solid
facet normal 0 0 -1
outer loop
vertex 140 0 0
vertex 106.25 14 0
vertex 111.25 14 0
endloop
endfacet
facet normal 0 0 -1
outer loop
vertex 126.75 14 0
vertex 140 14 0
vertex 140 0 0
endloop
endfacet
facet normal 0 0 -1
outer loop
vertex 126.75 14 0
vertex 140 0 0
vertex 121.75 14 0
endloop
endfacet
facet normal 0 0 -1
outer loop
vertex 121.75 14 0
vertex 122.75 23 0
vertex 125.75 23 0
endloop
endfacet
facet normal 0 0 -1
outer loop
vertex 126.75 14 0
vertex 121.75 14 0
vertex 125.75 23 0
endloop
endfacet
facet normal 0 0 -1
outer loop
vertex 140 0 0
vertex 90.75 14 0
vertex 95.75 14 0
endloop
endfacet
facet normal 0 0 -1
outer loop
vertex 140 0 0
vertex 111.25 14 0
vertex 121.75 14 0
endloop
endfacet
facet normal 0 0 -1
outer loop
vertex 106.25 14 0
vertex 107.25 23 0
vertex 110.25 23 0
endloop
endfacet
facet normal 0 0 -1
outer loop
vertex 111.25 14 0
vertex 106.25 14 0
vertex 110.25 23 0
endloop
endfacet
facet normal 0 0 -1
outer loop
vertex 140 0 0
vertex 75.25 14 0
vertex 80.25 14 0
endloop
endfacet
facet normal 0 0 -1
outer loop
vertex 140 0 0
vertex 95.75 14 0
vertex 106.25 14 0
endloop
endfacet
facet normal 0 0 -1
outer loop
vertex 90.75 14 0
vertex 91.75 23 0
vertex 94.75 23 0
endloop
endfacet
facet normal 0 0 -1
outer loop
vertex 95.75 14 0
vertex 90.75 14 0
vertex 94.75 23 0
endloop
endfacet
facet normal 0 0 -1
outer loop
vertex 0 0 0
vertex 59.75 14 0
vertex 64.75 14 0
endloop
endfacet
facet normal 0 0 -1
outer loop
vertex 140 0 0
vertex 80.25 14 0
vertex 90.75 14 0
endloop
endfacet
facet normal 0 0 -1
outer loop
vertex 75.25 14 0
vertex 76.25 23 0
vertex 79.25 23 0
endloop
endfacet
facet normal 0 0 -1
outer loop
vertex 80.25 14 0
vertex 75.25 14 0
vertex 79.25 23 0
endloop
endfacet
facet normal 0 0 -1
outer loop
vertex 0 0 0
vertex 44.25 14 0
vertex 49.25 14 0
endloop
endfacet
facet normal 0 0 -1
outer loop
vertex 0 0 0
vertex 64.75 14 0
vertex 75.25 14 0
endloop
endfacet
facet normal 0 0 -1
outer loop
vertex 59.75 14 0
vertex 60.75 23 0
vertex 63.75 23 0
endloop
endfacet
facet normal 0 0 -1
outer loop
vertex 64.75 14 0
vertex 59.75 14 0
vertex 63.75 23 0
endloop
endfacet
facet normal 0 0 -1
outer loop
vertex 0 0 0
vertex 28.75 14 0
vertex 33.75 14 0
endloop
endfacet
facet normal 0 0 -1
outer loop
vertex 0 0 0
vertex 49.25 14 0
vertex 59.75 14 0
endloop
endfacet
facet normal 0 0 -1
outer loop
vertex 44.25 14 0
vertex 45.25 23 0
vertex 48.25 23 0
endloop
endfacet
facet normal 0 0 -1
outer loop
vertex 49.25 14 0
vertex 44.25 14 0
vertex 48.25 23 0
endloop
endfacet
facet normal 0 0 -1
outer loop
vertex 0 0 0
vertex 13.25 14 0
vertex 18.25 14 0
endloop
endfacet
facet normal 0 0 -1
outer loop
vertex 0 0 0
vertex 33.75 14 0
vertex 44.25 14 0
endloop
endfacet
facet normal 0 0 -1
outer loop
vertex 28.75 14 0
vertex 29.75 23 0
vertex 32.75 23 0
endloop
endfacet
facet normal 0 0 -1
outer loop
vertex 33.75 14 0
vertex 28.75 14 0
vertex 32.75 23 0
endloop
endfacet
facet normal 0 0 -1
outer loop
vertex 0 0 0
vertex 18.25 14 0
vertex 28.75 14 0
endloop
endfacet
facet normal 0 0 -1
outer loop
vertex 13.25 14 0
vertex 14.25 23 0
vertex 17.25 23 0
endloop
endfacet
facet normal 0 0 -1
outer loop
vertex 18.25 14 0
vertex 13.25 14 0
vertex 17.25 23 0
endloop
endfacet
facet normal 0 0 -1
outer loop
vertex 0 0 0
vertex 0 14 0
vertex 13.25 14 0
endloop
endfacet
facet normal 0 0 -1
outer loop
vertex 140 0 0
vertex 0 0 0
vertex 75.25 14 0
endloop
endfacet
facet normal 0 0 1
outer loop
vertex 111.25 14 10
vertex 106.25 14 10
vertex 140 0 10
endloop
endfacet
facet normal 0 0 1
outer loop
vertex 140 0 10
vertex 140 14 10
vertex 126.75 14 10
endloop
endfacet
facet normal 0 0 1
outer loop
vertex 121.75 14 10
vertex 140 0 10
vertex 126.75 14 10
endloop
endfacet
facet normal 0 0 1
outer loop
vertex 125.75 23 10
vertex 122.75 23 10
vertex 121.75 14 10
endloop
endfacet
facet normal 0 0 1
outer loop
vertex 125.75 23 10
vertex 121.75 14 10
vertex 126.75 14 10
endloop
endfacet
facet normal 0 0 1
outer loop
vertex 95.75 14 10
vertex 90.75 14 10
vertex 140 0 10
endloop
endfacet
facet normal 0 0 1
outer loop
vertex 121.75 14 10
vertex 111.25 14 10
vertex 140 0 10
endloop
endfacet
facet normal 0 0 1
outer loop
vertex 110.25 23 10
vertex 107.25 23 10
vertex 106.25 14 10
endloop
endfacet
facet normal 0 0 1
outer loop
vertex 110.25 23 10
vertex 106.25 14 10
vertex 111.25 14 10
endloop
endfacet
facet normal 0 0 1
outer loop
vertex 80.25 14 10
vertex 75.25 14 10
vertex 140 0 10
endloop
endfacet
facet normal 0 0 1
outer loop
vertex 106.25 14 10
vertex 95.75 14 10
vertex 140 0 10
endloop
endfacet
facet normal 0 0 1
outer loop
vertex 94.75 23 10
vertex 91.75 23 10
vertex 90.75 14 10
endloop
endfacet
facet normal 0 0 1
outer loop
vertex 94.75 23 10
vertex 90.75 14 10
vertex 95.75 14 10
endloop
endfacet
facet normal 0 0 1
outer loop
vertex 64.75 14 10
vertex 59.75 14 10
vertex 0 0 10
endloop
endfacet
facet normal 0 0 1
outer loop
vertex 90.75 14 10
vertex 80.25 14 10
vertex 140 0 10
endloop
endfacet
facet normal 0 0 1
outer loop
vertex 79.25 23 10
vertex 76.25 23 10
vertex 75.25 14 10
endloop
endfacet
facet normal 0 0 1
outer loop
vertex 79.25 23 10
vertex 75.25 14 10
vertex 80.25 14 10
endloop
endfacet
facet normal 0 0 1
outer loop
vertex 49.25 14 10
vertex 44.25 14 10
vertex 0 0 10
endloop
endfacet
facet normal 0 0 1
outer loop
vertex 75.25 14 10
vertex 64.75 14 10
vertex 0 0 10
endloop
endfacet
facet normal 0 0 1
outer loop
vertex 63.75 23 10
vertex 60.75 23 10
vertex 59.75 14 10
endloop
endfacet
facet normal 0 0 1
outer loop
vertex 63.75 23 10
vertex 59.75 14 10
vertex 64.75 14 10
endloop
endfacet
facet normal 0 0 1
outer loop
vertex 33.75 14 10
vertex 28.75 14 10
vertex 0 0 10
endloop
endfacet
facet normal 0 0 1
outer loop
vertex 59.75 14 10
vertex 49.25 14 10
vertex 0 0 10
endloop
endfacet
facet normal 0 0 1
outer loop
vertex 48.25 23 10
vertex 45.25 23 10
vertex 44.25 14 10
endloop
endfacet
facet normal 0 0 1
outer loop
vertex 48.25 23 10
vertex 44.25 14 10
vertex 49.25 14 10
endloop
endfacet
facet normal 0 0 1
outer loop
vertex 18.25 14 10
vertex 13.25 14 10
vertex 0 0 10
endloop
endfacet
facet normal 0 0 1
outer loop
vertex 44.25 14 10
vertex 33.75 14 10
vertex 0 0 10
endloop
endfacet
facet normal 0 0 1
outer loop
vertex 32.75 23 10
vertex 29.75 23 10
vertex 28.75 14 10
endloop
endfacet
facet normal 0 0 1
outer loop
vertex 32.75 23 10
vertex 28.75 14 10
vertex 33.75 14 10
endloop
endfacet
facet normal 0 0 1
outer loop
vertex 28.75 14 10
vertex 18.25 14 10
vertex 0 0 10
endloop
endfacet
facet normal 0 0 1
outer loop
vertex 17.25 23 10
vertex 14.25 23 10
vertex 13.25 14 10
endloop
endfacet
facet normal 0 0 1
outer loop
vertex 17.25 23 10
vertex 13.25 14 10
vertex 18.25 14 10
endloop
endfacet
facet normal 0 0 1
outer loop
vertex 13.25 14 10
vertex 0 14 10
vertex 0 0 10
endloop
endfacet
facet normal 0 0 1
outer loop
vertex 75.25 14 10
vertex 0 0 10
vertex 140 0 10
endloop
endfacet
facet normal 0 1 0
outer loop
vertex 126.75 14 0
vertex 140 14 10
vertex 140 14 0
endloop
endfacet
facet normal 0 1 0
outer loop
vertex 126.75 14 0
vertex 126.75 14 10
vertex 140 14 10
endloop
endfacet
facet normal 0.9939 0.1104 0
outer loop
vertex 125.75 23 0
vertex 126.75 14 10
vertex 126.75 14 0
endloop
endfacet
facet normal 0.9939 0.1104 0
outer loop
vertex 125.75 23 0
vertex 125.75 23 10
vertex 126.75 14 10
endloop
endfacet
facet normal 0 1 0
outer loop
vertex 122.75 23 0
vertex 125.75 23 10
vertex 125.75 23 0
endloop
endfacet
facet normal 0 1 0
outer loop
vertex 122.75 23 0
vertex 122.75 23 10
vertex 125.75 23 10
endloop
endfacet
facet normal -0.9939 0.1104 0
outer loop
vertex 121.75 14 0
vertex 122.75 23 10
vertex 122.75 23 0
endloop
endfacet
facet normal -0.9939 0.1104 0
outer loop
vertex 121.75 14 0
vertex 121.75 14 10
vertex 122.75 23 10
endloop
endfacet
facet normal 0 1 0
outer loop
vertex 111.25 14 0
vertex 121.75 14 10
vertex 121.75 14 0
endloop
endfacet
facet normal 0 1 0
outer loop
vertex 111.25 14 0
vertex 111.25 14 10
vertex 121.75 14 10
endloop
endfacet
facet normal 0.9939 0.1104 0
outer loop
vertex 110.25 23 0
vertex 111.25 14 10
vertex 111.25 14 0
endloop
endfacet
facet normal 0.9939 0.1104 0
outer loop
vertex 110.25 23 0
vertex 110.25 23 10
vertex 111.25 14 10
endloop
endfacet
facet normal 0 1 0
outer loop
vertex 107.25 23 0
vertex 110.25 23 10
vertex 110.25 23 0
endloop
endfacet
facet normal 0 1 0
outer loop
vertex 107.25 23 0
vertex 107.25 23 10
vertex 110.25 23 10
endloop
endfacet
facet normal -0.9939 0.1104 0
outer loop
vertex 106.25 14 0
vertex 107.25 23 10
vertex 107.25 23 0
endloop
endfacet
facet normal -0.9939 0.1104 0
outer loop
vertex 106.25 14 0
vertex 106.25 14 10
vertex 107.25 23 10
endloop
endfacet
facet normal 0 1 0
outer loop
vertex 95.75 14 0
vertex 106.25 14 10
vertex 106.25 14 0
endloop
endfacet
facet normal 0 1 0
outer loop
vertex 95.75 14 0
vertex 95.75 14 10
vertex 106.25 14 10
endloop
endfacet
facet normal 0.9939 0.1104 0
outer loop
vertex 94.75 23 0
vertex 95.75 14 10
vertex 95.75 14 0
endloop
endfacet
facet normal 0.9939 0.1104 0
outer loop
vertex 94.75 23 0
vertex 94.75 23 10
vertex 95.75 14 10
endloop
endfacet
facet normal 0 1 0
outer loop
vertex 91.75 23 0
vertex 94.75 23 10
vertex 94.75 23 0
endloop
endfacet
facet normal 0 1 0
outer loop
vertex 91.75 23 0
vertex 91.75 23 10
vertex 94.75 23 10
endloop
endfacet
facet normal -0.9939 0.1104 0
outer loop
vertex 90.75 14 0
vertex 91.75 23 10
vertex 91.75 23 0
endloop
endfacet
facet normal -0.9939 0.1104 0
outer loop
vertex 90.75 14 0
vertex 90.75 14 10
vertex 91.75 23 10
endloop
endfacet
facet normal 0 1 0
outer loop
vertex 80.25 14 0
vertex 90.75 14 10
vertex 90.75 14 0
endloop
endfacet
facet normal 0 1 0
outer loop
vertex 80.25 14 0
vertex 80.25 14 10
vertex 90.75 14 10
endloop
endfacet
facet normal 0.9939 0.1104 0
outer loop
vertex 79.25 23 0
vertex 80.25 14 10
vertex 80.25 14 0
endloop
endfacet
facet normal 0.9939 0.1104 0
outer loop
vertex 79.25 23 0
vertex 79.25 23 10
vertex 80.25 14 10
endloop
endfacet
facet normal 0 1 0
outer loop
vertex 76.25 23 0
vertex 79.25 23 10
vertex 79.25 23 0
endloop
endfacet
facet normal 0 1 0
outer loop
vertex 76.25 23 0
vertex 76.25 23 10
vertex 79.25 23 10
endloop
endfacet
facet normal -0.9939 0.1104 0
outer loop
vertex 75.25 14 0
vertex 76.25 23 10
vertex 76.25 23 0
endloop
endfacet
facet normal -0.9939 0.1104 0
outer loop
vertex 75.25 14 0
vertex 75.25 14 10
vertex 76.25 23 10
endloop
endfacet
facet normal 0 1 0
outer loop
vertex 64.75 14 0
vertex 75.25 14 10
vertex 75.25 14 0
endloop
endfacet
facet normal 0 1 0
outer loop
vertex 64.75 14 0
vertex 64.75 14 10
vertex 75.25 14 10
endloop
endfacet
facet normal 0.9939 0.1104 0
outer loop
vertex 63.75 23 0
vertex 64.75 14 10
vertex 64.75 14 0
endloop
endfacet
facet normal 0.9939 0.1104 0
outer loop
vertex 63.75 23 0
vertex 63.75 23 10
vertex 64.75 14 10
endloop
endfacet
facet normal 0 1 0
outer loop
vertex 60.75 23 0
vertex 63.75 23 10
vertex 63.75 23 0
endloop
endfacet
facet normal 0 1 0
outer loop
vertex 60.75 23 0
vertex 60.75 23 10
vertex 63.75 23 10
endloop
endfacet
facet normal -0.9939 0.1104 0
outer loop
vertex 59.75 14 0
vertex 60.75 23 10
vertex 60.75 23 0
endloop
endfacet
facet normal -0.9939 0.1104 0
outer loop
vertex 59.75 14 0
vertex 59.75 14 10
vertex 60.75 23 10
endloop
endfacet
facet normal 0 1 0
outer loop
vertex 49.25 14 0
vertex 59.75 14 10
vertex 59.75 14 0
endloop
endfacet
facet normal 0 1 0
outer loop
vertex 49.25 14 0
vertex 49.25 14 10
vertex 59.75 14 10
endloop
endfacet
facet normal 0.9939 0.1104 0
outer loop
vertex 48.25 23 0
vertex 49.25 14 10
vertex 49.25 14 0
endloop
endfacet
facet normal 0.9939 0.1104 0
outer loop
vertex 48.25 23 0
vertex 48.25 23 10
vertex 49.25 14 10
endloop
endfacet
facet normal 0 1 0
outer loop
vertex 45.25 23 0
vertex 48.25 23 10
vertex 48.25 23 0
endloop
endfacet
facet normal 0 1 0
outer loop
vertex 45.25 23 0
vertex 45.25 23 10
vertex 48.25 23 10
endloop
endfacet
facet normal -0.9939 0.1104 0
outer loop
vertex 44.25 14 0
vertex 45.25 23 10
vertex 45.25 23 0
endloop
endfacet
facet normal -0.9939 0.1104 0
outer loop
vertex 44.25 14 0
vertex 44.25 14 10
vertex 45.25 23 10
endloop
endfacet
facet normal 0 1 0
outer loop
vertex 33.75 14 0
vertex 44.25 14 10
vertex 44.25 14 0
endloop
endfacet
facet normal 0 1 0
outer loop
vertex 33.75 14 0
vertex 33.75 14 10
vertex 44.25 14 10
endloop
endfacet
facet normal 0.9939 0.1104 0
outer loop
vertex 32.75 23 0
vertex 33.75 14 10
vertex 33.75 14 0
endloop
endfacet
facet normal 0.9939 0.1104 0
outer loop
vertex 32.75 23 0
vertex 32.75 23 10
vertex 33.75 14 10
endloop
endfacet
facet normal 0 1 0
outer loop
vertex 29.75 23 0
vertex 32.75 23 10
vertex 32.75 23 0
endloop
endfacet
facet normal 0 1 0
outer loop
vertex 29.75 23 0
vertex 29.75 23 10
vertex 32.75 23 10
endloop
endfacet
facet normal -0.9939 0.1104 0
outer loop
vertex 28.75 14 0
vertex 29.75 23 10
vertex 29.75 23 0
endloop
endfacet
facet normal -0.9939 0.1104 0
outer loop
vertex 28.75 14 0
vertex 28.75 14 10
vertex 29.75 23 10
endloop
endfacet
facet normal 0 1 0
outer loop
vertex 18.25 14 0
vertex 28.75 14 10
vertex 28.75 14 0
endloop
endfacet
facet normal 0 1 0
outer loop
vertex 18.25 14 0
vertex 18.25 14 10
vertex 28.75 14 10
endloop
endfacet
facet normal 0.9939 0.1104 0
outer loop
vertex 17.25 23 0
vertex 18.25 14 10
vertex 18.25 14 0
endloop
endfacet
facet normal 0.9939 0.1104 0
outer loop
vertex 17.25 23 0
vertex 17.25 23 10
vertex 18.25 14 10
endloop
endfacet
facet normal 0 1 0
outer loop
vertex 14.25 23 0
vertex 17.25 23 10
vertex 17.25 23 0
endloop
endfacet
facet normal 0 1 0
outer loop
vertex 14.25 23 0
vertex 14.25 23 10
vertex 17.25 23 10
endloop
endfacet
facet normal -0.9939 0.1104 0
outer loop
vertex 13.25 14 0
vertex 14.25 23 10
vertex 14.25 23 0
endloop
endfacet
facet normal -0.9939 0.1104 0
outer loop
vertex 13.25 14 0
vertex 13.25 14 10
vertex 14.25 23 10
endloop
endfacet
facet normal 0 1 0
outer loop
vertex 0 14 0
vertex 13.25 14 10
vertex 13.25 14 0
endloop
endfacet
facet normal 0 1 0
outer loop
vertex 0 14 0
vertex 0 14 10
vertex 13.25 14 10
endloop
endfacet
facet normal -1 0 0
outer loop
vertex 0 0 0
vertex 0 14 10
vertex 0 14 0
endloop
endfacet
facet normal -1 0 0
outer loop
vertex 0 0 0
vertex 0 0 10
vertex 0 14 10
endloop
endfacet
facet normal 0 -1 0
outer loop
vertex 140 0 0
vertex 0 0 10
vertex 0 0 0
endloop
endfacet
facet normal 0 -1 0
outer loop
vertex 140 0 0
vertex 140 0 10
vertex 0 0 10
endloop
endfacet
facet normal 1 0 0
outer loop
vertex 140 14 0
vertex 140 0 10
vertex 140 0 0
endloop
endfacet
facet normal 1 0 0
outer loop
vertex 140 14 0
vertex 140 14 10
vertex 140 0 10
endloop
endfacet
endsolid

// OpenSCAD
$fn = 32;

// ----------------------------------------------------------------------
// Gear rack: 8 teeth on a 140 mm bar, pitch 15.5 mm
// ----------------------------------------------------------------------

// --- parameters (mm) ---
profile_height = 10;      // extrusion height
profile_points = 36;      // points of the closed outline

profile = [[0, 0], [140, 0], [140, 14], [126.75, 14], [125.75, 23], [122.75, 23], [121.75, 14], [111.25, 14], [110.25, 23], [107.25, 23], [106.25, 14], [95.75, 14], [94.75, 23], [91.75, 23], [90.75, 14], [80.25, 14], [79.25, 23], [76.25, 23], [75.25, 14], [64.75, 14], [63.75, 23], [60.75, 23], [59.75, 14], [49.25, 14], [48.25, 23], [45.25, 23], [44.25, 14], [33.75, 14], [32.75, 23], [29.75, 23], [28.75, 14], [18.25, 14], [17.25, 23], [14.25, 23], [13.25, 14], [0, 14]];  // single closed polygon, 36 points, counter clockwise

// --- the one profile operation ---
linear_extrude(height = profile_height) polygon(points = profile);
